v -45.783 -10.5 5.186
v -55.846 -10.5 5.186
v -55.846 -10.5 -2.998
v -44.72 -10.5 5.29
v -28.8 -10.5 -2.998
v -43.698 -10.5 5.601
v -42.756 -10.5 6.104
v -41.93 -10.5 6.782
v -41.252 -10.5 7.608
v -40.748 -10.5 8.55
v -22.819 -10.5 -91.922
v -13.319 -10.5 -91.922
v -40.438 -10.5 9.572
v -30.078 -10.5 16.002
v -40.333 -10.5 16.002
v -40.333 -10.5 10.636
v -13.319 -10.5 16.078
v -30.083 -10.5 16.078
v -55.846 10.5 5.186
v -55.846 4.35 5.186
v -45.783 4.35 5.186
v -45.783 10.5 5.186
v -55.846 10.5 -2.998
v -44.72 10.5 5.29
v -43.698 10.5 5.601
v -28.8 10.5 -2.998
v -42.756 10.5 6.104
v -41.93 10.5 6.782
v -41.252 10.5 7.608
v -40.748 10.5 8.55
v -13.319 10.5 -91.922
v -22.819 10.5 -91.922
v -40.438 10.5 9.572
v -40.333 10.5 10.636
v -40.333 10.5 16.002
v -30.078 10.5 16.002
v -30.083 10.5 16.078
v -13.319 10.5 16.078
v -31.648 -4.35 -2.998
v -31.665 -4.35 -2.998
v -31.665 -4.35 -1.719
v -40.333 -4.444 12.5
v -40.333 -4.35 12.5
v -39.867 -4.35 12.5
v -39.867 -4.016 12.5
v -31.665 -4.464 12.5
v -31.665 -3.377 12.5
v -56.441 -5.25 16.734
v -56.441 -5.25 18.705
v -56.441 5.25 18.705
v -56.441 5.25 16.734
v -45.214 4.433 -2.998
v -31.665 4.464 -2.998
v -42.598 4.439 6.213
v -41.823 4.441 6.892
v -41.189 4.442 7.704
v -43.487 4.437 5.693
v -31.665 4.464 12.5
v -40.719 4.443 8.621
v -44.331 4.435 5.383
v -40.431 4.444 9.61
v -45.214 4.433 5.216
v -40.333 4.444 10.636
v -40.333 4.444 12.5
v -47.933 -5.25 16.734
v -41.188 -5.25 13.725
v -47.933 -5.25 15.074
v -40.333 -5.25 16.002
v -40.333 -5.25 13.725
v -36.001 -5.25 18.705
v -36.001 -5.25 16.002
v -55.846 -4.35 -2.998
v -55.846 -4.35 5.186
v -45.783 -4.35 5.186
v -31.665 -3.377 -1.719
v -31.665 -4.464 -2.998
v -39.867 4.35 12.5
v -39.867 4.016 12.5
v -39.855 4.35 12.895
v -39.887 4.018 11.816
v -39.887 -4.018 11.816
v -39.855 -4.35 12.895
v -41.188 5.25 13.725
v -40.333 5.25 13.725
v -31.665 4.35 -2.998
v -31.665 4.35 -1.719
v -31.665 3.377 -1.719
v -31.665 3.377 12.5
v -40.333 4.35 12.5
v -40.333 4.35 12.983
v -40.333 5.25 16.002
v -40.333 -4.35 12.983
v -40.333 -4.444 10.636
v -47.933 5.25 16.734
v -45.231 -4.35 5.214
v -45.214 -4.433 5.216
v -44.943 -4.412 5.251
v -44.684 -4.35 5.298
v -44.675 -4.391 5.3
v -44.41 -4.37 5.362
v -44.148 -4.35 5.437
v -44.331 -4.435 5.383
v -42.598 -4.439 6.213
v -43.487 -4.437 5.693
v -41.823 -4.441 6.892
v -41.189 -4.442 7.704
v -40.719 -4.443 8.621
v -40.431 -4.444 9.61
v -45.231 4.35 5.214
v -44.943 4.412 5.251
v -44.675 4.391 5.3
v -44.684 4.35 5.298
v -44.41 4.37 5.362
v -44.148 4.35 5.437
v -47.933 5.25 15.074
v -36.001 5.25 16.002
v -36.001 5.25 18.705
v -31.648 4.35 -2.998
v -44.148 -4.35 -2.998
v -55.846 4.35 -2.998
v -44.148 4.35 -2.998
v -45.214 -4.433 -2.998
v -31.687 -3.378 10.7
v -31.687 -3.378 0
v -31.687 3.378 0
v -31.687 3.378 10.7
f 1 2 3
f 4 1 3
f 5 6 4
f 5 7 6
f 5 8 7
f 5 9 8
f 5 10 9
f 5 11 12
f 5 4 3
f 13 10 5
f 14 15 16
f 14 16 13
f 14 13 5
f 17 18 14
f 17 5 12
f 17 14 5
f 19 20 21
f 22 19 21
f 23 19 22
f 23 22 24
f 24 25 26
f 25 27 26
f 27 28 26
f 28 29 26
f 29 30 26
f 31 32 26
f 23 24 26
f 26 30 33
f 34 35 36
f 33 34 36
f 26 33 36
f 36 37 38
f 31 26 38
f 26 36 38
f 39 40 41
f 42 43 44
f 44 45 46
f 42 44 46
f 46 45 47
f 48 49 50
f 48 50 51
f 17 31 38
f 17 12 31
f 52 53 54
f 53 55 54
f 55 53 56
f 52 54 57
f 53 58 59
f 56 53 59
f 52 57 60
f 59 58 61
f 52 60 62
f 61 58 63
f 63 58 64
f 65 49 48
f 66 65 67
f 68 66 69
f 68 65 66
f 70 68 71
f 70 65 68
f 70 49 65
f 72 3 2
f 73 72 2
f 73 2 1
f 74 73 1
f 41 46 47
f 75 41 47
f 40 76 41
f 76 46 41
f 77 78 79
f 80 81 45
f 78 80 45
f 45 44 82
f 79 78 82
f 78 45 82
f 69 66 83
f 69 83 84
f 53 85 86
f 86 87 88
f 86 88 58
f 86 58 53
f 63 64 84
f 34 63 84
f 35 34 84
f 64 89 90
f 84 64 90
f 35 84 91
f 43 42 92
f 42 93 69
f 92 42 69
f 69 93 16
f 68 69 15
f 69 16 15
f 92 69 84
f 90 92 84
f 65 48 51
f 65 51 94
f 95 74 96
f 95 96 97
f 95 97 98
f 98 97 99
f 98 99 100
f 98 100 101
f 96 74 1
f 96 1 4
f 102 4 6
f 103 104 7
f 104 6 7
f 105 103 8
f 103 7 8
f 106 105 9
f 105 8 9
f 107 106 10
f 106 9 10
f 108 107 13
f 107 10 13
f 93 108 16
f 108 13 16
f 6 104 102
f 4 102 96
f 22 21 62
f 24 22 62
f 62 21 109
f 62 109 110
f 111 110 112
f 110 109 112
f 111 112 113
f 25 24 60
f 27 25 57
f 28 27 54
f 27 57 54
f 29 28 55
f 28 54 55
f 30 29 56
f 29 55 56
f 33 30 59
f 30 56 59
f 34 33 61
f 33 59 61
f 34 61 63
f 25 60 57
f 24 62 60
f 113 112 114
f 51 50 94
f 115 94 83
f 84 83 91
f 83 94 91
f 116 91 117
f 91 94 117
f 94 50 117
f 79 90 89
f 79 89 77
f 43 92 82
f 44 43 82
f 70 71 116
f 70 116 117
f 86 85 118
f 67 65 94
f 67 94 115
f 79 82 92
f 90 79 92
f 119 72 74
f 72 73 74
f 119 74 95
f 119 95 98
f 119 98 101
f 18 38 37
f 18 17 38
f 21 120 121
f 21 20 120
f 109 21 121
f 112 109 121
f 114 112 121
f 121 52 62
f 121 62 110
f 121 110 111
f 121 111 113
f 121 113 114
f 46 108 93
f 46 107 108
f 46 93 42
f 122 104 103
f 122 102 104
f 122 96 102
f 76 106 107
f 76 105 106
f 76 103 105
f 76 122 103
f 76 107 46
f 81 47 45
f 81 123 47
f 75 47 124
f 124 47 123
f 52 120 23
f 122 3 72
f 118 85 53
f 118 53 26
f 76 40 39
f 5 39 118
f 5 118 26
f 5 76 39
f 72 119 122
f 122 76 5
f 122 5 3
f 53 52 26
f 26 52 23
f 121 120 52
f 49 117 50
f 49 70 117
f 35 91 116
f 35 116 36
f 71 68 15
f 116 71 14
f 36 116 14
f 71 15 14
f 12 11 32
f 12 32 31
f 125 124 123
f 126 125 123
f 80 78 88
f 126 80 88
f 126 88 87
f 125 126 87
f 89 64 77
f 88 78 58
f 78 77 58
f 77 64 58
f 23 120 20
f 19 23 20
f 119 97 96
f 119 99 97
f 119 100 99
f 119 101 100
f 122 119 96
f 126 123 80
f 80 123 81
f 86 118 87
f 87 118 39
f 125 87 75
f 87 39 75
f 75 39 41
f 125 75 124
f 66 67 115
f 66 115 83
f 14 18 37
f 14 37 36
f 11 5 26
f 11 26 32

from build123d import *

# Parameters (mm, degrees)
F0_W      = 30
F0_H      = 19
F1_DEPTH  = 10.5
F3_DEPTH  = 4.35
F6_DEPTH  = 12.5
F7_DEPTH  = 10.5
F9_DEPTH  = 5.25
F11_DEPTH = 10.5


with BuildPart() as f1:
    # F0 (on Front) → F1 (new body, symmetric)
    with BuildSketch(Plane.XZ):
        with Locations((-40.8455379754, 6.5018872991)):
            Rectangle(F0_W, F0_H)
    extrude(amount=F1_DEPTH, both=True)

    # F2 (on Front) → F3 (cut, symmetric)
    with BuildSketch(Plane.XZ):
        Polygon((-39.8867149711, 0), (-31.6867149711, 0), (-31.6867149711, 10.7), (-39.8867149711, 11.8163746178), (-39.8550798476, 12.8947440535), (-48.5550798476, 12.8947440535), (-48.5708974093, 14.4973720267), (-48.5867149711, 16.1), (-56.2867149711, 16.1), (-56.2867149711, 0), align=None)
        Polygon((-31.6346511245, -4.0566790849), (-31.6867149711, 0), (-39.8867149711, 0), (-56.2867149711, 0), (-56.2867149711, -4.0566790849), align=None)
        Polygon((-48.5550798476, 12.8947440535), (-39.8550798476, 12.8947440535), (-48.5708974093, 14.4973720267), align=None)
    extrude(amount=F3_DEPTH, both=True, mode=Mode.SUBTRACT)

    # F5 (on Top) → F6 (cut, symmetric)
    with BuildSketch(Plane.XY):
        Polygon((-31.664647162, -3.3765389722), (-45.2137924731, -4.4331237346), (-31.664647162, -4.4641996406), align=None)
        Polygon((-31.664647162, 4.4641996406), (-45.2137924731, 4.4331237346), (-31.664647162, 3.3765389722), align=None)
    extrude(amount=F6_DEPTH, both=True, mode=Mode.SUBTRACT)

    # F4 (on Front) → F7 (cut, symmetric)
    with BuildSketch(Plane.XZ):
        with BuildLine():
            Line((-45.7834748578, 16.0856869832), (-56.2834748578, 16.0856869832))
            Line((-56.2834748578, 16.0856869832), (-56.2834748578, 5.1856869832))
            Line((-56.2834748578, 5.1856869832), (-45.7834748578, 5.1856869832))
            ThreePointArc((-45.7834748578, 5.1856869832), (-41.9297429004, 6.7819550257), (-40.3334748578, 10.6356869832))
            ThreePointArc((-40.3334748578, 10.6356869832), (-41.9297429004, 14.4894189406), (-45.7834748578, 16.0856869832))
        make_face()
        with BuildLine():
            Line((-40.3334748578, 16.0856869832), (-45.7834748578, 16.0856869832))
            ThreePointArc((-45.7834748578, 16.0856869832), (-41.9297429004, 14.4894189406), (-40.3334748578, 10.6356869832))
            Line((-40.3334748578, 10.6356869832), (-40.3334748578, 16.0856869832))
        make_face()
    extrude(amount=F7_DEPTH, both=True, mode=Mode.SUBTRACT)

    # F8 (on Front) → F9 (join, symmetric)
    with BuildSketch(Plane.XZ):
        Polygon((-36.0005199909, 18.7051203102), (-56.4405918121, 18.7051203102), (-56.4405918121, 16.7337413877), (-47.9325428605, 16.7337413877), (-47.9325428605, 15.0736346841), (-41.1883555353, 13.7247974053), (-36.0005199909, 13.7247974053), align=None)
    extrude(amount=F9_DEPTH, both=True)

    # F10 (on Front) → F11 (join, symmetric)
    with BuildSketch(Plane.XZ):
        Polygon((-13.3185807616, 16.0780958831), (-25.8185807616, 16.0780958831), (-30.0829801708, 16.0780958831), (-22.8185807616, -91.9219041169), (-13.3185807616, -91.9219041169), align=None)
    extrude(amount=F11_DEPTH, both=True)


solid = f1.part
